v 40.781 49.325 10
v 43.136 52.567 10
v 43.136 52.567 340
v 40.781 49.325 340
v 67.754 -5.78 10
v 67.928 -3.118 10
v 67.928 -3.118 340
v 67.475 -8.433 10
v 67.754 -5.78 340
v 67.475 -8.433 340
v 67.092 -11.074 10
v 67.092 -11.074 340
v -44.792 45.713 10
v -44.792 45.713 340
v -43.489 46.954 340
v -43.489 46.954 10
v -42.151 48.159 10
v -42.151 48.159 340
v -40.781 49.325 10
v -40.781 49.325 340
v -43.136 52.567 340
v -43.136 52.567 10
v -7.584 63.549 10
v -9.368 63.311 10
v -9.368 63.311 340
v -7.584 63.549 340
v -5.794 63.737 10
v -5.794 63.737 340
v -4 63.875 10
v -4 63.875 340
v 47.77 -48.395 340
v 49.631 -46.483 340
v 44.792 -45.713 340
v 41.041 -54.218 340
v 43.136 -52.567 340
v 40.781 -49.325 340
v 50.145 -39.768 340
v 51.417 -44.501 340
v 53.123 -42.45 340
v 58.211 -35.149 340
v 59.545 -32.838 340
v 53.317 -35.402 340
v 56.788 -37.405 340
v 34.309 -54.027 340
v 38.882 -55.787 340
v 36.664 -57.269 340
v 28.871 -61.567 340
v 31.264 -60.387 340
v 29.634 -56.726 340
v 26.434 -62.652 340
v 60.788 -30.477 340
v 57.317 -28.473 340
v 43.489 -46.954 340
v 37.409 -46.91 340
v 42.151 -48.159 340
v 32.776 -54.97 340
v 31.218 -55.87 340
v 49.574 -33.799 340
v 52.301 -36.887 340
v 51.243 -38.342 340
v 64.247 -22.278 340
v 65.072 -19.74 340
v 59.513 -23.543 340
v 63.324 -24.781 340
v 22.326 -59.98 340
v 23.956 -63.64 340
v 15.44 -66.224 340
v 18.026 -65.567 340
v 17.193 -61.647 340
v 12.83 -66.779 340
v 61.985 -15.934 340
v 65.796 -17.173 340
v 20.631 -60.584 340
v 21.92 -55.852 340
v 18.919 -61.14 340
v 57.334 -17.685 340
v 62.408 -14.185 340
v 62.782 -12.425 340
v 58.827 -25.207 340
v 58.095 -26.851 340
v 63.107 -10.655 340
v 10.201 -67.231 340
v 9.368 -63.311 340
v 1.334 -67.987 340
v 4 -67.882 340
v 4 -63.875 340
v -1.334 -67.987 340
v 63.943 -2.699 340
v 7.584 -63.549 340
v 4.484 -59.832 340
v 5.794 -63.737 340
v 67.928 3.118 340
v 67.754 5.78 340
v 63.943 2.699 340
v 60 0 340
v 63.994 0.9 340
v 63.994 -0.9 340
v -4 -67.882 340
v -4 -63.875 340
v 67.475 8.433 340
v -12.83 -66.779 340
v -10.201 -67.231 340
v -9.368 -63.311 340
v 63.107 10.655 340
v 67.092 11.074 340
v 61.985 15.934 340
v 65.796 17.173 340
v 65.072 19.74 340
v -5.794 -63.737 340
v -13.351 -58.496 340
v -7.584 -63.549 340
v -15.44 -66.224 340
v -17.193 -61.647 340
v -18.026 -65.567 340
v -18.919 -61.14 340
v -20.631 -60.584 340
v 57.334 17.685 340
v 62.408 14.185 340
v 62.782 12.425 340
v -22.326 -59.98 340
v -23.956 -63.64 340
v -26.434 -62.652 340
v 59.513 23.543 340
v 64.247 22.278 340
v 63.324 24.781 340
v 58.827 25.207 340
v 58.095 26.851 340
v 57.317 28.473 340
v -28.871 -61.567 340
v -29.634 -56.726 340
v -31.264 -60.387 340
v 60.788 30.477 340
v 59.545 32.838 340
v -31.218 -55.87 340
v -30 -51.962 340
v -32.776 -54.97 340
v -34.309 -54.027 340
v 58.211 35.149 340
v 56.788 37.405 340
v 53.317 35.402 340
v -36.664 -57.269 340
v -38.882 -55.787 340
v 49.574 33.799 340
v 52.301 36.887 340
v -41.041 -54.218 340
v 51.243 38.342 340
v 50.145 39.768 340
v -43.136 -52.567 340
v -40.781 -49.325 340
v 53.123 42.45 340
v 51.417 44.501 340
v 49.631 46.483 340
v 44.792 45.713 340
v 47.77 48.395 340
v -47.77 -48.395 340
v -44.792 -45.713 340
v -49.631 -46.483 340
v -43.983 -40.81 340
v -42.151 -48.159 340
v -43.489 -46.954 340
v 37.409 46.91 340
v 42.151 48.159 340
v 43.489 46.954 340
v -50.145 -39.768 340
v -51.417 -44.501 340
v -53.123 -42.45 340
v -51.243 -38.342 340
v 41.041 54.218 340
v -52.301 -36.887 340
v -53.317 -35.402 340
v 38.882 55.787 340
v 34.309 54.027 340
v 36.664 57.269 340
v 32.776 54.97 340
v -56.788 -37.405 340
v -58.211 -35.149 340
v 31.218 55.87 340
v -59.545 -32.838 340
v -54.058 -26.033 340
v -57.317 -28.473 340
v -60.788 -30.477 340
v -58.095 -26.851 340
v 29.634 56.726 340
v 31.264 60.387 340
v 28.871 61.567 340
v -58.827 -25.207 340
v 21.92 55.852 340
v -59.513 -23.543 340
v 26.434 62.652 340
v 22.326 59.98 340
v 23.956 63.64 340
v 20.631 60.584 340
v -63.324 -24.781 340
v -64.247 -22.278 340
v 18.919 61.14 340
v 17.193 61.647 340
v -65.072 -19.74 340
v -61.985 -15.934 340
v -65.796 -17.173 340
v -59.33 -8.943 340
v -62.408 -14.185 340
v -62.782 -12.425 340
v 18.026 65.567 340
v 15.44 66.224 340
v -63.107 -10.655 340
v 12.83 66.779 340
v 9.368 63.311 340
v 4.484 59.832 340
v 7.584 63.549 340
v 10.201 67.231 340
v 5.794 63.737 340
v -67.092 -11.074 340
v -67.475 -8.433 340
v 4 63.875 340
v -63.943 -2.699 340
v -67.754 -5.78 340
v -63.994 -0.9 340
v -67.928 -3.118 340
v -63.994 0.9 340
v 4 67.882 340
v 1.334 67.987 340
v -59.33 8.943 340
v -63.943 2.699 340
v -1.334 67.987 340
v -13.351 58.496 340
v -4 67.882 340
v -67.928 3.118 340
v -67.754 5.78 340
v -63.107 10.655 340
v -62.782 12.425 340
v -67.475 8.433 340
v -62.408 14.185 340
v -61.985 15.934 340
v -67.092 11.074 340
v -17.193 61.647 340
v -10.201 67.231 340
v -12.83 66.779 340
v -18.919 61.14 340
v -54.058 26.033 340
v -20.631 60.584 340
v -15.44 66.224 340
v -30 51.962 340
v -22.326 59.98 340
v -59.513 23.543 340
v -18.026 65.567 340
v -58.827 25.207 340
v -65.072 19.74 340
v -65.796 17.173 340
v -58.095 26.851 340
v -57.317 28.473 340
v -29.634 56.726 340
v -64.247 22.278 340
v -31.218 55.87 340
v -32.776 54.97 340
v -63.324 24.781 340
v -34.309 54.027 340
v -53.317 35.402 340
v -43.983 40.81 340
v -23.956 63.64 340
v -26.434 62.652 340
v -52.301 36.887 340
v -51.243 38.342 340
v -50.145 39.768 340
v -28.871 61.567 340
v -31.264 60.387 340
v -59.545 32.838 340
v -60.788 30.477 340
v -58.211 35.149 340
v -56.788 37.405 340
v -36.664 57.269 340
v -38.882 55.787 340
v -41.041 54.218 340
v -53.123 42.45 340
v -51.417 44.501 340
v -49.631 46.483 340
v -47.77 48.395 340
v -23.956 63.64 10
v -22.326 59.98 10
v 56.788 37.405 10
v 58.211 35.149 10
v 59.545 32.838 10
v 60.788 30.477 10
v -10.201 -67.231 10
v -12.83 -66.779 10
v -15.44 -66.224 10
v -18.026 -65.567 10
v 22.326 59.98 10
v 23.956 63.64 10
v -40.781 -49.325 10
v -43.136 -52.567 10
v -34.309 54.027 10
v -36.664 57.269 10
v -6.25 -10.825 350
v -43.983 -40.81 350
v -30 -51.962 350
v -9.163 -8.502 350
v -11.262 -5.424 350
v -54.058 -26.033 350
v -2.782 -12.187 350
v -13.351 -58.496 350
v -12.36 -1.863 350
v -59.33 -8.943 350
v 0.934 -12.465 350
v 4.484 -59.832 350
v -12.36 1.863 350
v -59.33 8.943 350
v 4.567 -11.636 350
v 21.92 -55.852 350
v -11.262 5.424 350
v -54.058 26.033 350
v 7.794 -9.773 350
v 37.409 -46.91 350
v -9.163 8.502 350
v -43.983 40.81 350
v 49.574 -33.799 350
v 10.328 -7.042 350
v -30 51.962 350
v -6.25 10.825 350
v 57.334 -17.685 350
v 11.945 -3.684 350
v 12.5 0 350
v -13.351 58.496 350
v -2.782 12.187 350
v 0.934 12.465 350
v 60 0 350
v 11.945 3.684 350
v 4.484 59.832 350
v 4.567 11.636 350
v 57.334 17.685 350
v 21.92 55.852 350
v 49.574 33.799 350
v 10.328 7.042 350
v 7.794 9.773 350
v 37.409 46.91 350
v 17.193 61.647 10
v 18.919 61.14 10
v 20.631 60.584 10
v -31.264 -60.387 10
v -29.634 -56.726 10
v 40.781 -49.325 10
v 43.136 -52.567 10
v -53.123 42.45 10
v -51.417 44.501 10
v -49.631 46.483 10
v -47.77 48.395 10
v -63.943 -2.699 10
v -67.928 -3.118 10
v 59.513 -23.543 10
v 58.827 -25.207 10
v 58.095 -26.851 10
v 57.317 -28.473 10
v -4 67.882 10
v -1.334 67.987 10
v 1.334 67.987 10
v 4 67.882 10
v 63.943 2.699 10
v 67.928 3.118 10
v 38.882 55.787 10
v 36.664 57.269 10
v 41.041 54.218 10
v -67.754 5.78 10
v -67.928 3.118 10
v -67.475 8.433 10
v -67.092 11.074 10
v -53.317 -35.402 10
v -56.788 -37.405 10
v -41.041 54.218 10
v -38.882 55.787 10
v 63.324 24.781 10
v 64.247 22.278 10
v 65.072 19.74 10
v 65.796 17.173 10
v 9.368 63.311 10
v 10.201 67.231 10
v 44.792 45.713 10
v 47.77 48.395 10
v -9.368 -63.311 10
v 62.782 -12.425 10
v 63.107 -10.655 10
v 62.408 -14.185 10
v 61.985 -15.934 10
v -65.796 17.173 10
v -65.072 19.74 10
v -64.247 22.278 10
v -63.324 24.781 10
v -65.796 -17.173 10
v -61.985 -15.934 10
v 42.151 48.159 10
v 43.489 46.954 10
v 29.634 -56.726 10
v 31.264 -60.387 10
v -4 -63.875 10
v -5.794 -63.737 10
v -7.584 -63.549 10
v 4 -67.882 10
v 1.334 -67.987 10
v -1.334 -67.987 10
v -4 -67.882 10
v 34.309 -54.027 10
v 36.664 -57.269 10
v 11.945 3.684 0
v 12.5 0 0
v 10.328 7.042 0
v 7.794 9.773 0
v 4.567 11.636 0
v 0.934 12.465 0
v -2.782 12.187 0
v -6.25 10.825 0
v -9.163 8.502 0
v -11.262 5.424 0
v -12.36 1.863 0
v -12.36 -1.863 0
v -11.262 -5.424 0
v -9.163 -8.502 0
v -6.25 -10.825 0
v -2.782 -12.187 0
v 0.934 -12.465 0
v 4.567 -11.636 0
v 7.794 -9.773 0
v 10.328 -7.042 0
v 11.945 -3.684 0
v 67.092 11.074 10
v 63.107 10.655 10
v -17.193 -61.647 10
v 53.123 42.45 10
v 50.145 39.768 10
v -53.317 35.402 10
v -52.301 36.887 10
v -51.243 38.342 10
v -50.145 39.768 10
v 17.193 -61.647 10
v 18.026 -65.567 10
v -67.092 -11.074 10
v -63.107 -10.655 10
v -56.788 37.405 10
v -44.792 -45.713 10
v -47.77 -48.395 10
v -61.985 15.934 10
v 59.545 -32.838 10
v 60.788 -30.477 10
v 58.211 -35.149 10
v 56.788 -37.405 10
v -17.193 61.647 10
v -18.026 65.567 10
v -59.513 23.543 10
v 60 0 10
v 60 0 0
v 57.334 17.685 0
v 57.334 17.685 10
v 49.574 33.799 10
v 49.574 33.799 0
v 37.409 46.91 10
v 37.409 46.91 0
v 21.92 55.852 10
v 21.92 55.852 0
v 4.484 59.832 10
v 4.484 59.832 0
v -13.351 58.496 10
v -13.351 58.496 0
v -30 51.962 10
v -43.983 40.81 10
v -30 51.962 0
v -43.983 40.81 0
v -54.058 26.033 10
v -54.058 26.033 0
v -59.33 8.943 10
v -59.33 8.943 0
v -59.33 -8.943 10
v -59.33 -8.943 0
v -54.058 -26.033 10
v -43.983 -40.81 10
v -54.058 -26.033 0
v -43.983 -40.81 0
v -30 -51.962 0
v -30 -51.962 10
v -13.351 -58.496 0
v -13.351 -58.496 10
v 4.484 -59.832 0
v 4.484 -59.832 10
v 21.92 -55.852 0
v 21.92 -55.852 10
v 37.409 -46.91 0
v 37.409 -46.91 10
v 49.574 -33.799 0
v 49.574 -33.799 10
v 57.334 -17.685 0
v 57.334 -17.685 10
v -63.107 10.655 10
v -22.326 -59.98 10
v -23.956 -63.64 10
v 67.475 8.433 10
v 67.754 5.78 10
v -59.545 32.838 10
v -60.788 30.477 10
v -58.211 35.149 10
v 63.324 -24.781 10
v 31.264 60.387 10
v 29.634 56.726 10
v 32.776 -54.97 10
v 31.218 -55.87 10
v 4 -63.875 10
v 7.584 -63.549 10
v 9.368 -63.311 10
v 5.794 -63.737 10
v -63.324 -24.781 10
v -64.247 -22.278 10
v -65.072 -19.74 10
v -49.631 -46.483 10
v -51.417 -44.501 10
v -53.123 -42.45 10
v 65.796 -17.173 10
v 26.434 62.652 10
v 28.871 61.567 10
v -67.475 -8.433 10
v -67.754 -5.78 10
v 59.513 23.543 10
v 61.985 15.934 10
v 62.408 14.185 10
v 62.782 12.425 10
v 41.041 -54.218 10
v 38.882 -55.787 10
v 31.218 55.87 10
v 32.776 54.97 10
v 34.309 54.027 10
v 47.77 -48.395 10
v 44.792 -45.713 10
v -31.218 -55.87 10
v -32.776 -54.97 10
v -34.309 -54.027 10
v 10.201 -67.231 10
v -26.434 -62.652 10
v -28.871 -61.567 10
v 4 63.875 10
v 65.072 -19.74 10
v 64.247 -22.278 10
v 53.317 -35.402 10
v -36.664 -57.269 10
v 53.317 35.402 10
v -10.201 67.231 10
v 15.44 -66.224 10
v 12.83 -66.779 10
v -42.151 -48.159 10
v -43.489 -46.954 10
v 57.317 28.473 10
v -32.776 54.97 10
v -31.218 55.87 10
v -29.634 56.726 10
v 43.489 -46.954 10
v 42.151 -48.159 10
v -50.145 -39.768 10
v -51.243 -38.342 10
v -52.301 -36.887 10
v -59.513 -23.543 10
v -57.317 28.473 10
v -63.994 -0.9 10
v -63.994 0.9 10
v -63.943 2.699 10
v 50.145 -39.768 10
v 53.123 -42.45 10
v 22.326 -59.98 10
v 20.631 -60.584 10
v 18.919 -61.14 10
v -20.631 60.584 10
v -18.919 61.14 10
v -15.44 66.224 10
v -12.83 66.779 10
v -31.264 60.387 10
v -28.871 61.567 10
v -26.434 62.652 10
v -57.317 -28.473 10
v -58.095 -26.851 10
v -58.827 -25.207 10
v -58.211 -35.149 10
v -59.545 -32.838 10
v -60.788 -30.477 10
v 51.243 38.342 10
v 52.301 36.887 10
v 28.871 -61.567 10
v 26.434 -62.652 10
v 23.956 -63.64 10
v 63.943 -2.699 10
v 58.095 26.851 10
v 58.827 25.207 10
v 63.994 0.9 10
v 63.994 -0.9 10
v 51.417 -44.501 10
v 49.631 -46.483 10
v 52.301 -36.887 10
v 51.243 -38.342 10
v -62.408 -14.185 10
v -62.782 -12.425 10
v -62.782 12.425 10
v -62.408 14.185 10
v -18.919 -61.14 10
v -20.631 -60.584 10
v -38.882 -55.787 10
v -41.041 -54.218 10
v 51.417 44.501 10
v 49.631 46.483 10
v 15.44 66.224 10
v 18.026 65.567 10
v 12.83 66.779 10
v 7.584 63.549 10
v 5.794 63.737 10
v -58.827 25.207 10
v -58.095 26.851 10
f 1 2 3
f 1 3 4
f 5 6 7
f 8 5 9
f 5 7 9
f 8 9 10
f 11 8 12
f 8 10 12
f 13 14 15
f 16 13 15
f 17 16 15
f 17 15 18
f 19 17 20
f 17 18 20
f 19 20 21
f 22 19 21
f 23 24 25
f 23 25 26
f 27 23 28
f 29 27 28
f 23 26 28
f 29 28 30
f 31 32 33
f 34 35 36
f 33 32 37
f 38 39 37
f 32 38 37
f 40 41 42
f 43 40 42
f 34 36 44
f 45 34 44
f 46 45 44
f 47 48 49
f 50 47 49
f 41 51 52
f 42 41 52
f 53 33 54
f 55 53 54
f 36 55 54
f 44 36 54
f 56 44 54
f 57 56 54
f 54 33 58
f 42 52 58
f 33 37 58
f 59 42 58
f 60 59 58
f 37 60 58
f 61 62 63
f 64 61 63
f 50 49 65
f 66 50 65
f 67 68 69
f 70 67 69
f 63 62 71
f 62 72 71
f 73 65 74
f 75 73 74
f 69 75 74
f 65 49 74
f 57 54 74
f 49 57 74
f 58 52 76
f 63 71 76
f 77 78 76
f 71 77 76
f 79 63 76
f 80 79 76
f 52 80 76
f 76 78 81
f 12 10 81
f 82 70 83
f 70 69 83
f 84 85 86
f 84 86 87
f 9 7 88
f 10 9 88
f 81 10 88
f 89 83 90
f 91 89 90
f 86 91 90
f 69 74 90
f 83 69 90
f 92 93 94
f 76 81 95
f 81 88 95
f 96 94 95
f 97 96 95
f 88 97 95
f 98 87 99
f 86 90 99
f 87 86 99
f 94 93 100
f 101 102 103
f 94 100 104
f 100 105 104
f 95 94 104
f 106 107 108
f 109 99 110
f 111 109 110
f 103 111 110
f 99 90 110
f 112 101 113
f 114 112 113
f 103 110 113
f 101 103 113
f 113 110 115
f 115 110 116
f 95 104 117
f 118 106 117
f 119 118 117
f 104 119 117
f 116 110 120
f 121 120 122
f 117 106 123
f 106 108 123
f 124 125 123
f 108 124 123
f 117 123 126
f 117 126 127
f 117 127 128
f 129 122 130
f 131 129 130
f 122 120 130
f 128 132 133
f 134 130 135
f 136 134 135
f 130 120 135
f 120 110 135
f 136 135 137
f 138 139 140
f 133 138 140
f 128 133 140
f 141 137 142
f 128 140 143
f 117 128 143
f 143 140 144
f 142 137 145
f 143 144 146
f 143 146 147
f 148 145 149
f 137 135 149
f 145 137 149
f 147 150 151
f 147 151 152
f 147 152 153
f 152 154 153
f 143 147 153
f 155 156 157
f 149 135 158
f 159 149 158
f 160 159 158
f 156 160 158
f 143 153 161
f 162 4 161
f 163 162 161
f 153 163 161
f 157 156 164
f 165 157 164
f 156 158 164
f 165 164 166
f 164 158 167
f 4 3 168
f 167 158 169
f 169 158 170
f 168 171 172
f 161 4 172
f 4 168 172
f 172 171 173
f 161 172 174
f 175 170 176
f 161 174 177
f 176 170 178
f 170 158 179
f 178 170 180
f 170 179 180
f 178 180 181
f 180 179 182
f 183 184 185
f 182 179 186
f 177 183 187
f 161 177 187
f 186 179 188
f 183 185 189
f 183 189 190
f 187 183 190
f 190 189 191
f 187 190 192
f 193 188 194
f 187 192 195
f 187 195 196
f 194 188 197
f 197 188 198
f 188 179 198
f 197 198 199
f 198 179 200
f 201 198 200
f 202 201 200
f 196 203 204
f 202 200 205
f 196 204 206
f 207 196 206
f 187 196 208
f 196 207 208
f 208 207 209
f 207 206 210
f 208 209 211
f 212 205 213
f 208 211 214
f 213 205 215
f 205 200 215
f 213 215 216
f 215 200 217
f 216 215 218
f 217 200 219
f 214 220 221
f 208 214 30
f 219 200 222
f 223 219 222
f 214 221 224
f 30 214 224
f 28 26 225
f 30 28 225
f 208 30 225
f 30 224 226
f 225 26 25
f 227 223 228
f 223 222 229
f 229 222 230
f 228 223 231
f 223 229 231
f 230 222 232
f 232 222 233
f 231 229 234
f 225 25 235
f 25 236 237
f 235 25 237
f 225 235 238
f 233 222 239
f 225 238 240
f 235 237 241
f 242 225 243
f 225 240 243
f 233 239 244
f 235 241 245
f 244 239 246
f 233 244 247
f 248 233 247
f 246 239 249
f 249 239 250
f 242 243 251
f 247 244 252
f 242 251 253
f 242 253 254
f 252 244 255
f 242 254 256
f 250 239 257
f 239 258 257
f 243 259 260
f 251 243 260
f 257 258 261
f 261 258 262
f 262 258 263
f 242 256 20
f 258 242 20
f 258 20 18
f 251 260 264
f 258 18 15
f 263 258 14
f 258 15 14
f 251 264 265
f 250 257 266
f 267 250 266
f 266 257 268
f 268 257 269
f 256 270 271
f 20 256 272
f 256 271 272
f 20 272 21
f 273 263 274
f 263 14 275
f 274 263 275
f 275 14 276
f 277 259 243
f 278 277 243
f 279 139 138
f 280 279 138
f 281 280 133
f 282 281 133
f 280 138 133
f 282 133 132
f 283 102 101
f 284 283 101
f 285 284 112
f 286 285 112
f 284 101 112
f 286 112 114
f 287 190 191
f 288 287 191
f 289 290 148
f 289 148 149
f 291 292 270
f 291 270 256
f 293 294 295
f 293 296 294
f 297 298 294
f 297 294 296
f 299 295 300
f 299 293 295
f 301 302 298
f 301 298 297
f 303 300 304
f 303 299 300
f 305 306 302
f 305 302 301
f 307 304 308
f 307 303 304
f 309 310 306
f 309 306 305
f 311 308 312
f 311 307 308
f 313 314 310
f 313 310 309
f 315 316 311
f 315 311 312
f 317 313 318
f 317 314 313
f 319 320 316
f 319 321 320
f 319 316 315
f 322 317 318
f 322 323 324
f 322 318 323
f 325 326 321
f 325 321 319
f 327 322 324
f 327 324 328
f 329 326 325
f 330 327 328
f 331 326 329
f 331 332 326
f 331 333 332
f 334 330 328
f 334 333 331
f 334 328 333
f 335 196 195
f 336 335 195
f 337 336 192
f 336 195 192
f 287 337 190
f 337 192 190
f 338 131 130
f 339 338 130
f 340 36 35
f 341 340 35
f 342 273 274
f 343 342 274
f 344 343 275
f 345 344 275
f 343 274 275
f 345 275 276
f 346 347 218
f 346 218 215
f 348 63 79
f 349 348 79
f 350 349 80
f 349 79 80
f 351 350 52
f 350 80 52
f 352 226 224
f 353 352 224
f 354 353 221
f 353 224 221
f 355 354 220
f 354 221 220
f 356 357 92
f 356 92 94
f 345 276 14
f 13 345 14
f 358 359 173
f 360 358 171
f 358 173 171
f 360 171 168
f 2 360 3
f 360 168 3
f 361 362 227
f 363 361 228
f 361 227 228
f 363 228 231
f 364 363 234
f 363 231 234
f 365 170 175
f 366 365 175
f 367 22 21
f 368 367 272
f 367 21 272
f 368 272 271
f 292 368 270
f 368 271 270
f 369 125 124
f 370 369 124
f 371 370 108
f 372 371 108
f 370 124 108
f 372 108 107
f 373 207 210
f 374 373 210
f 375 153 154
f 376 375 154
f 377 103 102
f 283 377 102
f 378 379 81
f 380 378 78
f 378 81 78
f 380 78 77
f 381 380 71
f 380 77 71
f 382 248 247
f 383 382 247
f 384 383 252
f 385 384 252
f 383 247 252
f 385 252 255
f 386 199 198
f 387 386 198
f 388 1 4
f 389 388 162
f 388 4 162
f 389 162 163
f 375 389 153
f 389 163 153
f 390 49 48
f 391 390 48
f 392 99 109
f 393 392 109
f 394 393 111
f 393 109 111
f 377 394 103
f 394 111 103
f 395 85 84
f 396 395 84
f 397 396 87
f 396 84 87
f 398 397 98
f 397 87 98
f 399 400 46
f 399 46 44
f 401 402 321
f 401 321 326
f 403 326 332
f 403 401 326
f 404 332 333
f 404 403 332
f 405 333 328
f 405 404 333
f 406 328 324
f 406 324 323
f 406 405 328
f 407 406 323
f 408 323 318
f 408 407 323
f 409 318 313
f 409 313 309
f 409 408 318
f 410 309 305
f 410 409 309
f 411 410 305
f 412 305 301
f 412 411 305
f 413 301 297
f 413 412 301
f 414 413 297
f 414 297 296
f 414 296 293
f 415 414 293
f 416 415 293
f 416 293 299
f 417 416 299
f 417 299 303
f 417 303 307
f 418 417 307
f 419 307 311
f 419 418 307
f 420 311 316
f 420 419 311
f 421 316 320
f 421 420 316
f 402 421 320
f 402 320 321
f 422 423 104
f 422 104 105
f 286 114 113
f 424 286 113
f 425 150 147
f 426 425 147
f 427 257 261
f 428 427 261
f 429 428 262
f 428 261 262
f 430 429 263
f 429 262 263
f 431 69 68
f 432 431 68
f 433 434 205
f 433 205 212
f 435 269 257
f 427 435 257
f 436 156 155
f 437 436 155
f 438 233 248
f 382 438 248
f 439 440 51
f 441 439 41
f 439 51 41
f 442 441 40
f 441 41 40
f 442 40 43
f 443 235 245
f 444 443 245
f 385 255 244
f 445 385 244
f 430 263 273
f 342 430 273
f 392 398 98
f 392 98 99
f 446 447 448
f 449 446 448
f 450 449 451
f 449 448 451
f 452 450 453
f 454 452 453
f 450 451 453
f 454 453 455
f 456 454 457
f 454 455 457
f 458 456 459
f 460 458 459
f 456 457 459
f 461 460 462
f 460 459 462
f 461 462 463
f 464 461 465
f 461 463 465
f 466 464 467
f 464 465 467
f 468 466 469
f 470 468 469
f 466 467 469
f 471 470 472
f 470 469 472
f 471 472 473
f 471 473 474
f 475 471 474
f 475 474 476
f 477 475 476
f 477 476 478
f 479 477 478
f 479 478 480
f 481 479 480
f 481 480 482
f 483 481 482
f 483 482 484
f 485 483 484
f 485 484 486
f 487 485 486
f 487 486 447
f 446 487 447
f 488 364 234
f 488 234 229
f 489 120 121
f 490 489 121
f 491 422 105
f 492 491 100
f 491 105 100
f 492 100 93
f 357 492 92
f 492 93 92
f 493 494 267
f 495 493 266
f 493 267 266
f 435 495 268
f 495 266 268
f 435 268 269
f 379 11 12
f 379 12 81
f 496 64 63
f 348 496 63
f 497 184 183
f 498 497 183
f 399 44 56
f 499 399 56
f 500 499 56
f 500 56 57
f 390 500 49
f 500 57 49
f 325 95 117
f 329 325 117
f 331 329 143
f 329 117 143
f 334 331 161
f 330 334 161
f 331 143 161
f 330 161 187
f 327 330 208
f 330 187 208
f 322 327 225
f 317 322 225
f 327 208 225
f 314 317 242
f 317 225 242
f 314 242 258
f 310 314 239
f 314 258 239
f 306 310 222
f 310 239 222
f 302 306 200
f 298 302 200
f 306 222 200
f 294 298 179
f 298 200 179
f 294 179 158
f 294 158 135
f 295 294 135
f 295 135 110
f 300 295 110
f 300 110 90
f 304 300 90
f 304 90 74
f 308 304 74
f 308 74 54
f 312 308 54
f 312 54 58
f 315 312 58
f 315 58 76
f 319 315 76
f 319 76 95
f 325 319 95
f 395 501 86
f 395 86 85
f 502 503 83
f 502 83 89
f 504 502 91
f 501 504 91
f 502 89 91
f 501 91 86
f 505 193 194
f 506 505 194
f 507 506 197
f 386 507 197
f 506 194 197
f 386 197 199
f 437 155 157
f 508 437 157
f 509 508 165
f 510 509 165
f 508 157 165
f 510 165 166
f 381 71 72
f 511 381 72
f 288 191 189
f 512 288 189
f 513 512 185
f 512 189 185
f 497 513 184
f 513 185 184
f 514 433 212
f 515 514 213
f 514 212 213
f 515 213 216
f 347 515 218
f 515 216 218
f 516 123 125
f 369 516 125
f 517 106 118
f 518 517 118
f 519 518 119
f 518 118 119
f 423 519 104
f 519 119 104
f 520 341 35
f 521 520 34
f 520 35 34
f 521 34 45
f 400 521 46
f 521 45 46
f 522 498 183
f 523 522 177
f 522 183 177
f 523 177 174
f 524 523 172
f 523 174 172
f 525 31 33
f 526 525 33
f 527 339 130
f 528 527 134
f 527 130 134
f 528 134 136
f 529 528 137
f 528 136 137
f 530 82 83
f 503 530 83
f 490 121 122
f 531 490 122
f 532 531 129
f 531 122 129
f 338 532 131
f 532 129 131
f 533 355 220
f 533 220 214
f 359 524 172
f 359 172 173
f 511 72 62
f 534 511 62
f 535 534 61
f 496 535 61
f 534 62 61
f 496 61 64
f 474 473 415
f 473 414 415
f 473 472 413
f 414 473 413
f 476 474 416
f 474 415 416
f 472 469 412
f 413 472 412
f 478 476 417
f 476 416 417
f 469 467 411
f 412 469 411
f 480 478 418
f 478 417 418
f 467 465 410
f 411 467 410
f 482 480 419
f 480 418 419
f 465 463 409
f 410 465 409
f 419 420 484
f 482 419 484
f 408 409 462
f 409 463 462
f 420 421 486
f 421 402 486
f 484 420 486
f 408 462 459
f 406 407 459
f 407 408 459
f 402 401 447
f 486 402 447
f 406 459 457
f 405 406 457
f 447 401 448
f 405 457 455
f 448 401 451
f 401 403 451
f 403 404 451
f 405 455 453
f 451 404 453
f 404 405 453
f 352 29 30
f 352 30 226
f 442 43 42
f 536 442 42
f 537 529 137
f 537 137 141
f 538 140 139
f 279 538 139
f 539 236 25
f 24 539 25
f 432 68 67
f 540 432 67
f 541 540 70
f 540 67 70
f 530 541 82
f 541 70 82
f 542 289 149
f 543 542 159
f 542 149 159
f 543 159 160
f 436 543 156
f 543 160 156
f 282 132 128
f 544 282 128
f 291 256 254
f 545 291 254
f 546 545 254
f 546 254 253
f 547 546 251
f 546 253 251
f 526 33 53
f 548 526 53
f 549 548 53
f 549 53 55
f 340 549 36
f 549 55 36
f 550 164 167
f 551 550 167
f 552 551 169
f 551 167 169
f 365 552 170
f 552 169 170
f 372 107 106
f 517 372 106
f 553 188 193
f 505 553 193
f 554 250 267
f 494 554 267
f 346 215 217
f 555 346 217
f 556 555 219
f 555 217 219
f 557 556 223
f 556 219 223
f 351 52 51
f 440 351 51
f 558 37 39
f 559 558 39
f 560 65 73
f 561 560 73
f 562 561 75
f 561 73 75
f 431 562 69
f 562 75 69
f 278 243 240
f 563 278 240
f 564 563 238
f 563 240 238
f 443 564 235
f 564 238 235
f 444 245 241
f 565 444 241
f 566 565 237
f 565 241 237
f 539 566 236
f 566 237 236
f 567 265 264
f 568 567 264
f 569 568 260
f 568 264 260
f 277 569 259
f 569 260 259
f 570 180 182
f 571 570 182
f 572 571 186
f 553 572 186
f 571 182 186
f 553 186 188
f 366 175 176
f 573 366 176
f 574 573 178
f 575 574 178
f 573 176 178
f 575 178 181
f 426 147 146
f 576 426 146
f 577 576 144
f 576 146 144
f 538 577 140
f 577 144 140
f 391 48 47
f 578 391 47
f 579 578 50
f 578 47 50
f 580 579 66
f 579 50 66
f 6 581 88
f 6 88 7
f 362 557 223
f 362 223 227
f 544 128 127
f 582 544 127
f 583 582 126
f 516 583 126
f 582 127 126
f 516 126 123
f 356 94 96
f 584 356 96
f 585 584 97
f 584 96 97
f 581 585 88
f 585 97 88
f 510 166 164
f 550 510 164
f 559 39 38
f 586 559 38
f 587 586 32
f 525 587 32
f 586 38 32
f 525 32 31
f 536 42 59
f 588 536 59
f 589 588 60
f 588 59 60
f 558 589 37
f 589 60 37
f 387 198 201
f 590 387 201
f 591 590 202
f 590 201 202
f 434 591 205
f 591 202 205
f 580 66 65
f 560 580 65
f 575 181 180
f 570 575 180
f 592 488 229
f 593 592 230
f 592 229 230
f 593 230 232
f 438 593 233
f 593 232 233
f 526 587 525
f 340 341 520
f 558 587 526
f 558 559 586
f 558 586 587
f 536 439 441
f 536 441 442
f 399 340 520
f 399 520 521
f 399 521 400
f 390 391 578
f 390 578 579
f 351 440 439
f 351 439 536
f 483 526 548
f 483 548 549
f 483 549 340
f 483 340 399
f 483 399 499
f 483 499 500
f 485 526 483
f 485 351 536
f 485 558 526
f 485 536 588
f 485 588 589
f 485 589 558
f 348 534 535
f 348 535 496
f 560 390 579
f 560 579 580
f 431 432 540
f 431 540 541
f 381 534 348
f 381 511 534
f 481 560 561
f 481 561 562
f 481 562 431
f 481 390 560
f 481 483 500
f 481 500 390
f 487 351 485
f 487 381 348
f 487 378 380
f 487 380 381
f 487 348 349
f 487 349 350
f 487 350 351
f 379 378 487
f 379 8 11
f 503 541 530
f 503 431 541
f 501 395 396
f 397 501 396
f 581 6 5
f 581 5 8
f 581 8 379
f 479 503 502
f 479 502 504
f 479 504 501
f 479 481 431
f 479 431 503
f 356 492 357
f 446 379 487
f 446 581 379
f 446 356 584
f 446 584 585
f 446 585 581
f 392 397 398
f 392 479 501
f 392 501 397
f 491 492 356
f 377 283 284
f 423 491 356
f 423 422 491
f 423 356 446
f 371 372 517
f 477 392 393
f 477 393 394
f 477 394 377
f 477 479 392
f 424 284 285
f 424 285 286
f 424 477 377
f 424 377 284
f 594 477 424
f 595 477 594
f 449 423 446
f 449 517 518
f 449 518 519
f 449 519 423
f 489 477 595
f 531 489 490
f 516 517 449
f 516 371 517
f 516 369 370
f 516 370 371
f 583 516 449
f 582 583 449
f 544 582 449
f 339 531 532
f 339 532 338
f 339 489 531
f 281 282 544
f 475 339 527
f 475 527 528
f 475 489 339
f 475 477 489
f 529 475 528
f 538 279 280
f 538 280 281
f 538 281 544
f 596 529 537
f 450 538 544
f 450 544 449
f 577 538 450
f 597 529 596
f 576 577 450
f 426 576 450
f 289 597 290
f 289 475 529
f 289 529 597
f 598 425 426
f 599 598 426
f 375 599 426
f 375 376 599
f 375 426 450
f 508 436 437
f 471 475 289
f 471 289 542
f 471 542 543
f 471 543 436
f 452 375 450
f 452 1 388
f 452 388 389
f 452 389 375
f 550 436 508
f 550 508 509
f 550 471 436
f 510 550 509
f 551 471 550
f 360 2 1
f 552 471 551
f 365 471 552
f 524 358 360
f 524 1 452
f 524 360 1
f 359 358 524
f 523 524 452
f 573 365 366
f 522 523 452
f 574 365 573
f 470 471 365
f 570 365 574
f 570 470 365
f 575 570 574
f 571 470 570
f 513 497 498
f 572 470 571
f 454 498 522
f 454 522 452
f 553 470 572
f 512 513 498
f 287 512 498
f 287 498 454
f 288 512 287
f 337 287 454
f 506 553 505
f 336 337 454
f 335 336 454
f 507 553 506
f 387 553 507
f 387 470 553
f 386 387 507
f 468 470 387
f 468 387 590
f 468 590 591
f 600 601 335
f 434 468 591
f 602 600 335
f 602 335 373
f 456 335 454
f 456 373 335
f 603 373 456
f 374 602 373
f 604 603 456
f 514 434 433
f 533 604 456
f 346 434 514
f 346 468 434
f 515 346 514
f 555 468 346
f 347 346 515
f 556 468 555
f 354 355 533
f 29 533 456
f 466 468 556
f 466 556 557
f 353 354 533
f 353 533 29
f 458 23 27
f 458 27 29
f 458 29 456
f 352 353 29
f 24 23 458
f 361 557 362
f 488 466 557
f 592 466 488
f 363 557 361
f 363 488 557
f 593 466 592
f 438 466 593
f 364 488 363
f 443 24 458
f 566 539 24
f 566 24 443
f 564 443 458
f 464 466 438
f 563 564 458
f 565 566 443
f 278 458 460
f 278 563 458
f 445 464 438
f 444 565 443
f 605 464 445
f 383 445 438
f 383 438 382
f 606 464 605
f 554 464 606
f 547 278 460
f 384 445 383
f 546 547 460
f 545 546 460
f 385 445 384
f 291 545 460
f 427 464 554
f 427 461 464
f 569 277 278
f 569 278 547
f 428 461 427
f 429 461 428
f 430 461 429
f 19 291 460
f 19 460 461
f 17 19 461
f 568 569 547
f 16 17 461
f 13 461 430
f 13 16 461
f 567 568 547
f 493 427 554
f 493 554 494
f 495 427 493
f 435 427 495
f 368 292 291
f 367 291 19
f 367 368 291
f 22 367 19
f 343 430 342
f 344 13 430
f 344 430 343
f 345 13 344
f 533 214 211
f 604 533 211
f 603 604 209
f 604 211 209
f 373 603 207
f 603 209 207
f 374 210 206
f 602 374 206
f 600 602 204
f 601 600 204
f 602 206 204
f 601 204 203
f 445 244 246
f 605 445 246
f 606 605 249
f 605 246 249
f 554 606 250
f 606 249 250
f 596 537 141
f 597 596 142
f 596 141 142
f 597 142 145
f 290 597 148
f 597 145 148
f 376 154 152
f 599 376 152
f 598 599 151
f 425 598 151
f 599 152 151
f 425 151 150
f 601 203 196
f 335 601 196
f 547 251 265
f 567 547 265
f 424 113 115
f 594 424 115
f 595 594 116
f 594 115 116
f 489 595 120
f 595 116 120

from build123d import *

# Parameters (mm, degrees)
SKETCH1_R           = 60
SKETCH1_R_2         = 12.5
BOSS_EXTRUDE1_DEPTH = 350
SKETCH2_R           = 60
BOSS_EXTRUDE2_DEPTH = 330


with BuildPart() as part:
    # Sketch1 → Boss-Extrude1 (new body)
    with BuildSketch(Plane.XY):
        Circle(SKETCH1_R)
        Circle(SKETCH1_R_2, mode=Mode.SUBTRACT)
    extrude(amount=BOSS_EXTRUDE1_DEPTH)

    # Sketch2 → Boss-Extrude2 (add)
    with BuildSketch(Plane.XY.offset(340)):
        with BuildLine():
            Line((9.367743419, 63.310705124), (10.200923178, 67.230507705))
            ThreePointArc((10.200923178, 67.230507705), (14.137994976, 66.51403685), (18.026103984, 65.567214179))
            Line((18.026103984, 65.567214179), (17.192924224, 61.647411597))
            ThreePointArc((17.192924224, 61.647411597), (19.77708764, 60.867617043), (22.326071498, 59.979550944))
            Line((22.326071498, 59.979550944), (23.956017063, 63.640468622))
            ThreePointArc((23.956017063, 63.640468622), (27.658091729, 62.12109112), (31.264380724, 60.386575478))
            Line((31.264380724, 60.386575478), (29.634435159, 56.725657799))
            ThreePointArc((29.634435159, 56.725657799), (32, 55.425625842), (34.308643121, 54.027002575))
            Line((34.308643121, 54.027002575), (36.664118049, 57.26903568))
            ThreePointArc((36.664118049, 57.26903568), (39.969397156, 55.013155617), (43.136254004, 52.566753661))
            Line((43.136254004, 52.566753661), (40.780779076, 49.324720556))
            ThreePointArc((40.780779076, 49.324720556), (42.824358807, 47.561268831), (44.791762408, 45.713214942))
            Line((44.791762408, 45.713214942), (47.769821142, 48.39467107))
            ThreePointArc((47.769821142, 48.39467107), (50.533848132, 45.500881232), (53.122865993, 42.449512467))
            Line((53.122865993, 42.449512467), (50.144807259, 39.768056338))
            ThreePointArc((50.144807259, 39.768056338), (51.77708764, 37.618256147), (53.317266744, 35.40154046))
            Line((53.317266744, 35.40154046), (56.787753827, 37.405227112))
            ThreePointArc((56.787753827, 37.405227112), (58.889727457, 34), (60.787753827, 30.477023882))
            Line((60.787753827, 30.477023882), (57.317266744, 28.47333723))
            ThreePointArc((57.317266744, 28.47333723), (58.466909289, 26.031145157), (59.512550678, 23.542648785))
            Line((59.512550678, 23.542648785), (63.323789171, 24.780995239))
            ThreePointArc((63.323789171, 24.780995239), (64.671843108, 21.013155617), (65.795925126, 17.172543108))
            Line((65.795925126, 17.172543108), (61.984686633, 15.934196655))
            ThreePointArc((61.984686633, 15.934196655), (62.601446447, 13.306348212), (63.106850574, 10.654830388))
            Line((63.106850574, 10.654830388), (67.092271067, 11.073714961))
            ThreePointArc((67.092271067, 11.073714961), (67.627488885, 7.107935502), (67.928498773, 3.117539798))
            Line((67.928498773, 3.117539798), (63.94307828, 2.698655225))
            ThreePointArc((63.94307828, 2.698655225), (64, 0), (63.94307828, -2.698655225))
            Line((63.94307828, -2.698655225), (67.928498773, -3.117539798))
            ThreePointArc((67.928498773, -3.117539798), (67.627488885, -7.107935502), (67.092271067, -11.073714961))
            Line((67.092271067, -11.073714961), (63.106850574, -10.654830388))
            ThreePointArc((63.106850574, -10.654830388), (62.601446447, -13.306348212), (61.984686633, -15.934196655))
            Line((61.984686633, -15.934196655), (65.795925126, -17.172543108))
            ThreePointArc((65.795925126, -17.172543108), (64.671843108, -21.013155617), (63.323789171, -24.780995239))
            Line((63.323789171, -24.780995239), (59.512550678, -23.542648785))
            ThreePointArc((59.512550678, -23.542648785), (58.466909289, -26.031145157), (57.317266744, -28.47333723))
            Line((57.317266744, -28.47333723), (60.787753827, -30.477023882))
            ThreePointArc((60.787753827, -30.477023882), (58.889727457, -34), (56.787753827, -37.405227112))
            Line((56.787753827, -37.405227112), (53.317266744, -35.40154046))
            ThreePointArc((53.317266744, -35.40154046), (51.77708764, -37.618256147), (50.144807259, -39.768056338))
            Line((50.144807259, -39.768056338), (53.122865993, -42.449512467))
            ThreePointArc((53.122865993, -42.449512467), (50.533848132, -45.500881232), (47.769821142, -48.39467107))
            Line((47.769821142, -48.39467107), (44.791762408, -45.713214942))
            ThreePointArc((44.791762408, -45.713214942), (42.824358807, -47.561268831), (40.780779076, -49.324720556))
            Line((40.780779076, -49.324720556), (43.136254004, -52.566753661))
            ThreePointArc((43.136254004, -52.566753661), (39.969397156, -55.013155617), (36.664118049, -57.26903568))
            Line((36.664118049, -57.26903568), (34.308643121, -54.027002575))
            ThreePointArc((34.308643121, -54.027002575), (32, -55.425625842), (29.634435159, -56.725657799))
            Line((29.634435159, -56.725657799), (31.264380724, -60.386575478))
            ThreePointArc((31.264380724, -60.386575478), (27.658091729, -62.12109112), (23.956017063, -63.640468622))
            Line((23.956017063, -63.640468622), (22.326071498, -59.979550944))
            ThreePointArc((22.326071498, -59.979550944), (19.77708764, -60.867617043), (17.192924224, -61.647411597))
            Line((17.192924224, -61.647411597), (18.026103984, -65.567214179))
            ThreePointArc((18.026103984, -65.567214179), (14.137994976, -66.51403685), (10.200923178, -67.230507705))
            Line((10.200923178, -67.230507705), (9.367743419, -63.310705124))
            ThreePointArc((9.367743419, -63.310705124), (6.689821649, -63.649401304), (4, -63.874877691))
            Line((4, -63.874877691), (4, -67.882250994))
            ThreePointArc((4, -67.882250994), (0, -68), (-4, -67.882250994))
            Line((-4, -67.882250994), (-4, -63.874877691))
            ThreePointArc((-4, -63.874877691), (-6.689821649, -63.649401304), (-9.367743419, -63.310705124))
            Line((-9.367743419, -63.310705124), (-10.200923178, -67.230507705))
            ThreePointArc((-10.200923178, -67.230507705), (-14.137994976, -66.51403685), (-18.026103984, -65.567214179))
            Line((-18.026103984, -65.567214179), (-17.192924224, -61.647411597))
            ThreePointArc((-17.192924224, -61.647411597), (-19.77708764, -60.867617043), (-22.326071498, -59.979550944))
            Line((-22.326071498, -59.979550944), (-23.956017063, -63.640468622))
            ThreePointArc((-23.956017063, -63.640468622), (-27.658091729, -62.12109112), (-31.264380724, -60.386575478))
            Line((-31.264380724, -60.386575478), (-29.634435159, -56.725657799))
            ThreePointArc((-29.634435159, -56.725657799), (-32, -55.425625842), (-34.308643121, -54.027002575))
            Line((-34.308643121, -54.027002575), (-36.664118049, -57.26903568))
            ThreePointArc((-36.664118049, -57.26903568), (-39.969397156, -55.013155617), (-43.136254004, -52.566753661))
            Line((-43.136254004, -52.566753661), (-40.780779076, -49.324720556))
            ThreePointArc((-40.780779076, -49.324720556), (-42.824358807, -47.561268831), (-44.791762408, -45.713214942))
            Line((-44.791762408, -45.713214942), (-47.769821142, -48.39467107))
            ThreePointArc((-47.769821142, -48.39467107), (-50.533848132, -45.500881232), (-53.122865993, -42.449512467))
            Line((-53.122865993, -42.449512467), (-50.144807259, -39.768056338))
            ThreePointArc((-50.144807259, -39.768056338), (-51.77708764, -37.618256147), (-53.317266744, -35.40154046))
            Line((-53.317266744, -35.40154046), (-56.787753827, -37.405227112))
            ThreePointArc((-56.787753827, -37.405227112), (-58.889727457, -34), (-60.787753827, -30.477023882))
            Line((-60.787753827, -30.477023882), (-57.317266744, -28.47333723))
            ThreePointArc((-57.317266744, -28.47333723), (-58.466909289, -26.031145157), (-59.512550678, -23.542648785))
            Line((-59.512550678, -23.542648785), (-63.323789171, -24.780995239))
            ThreePointArc((-63.323789171, -24.780995239), (-64.671843108, -21.013155617), (-65.795925126, -17.172543108))
            Line((-65.795925126, -17.172543108), (-61.984686633, -15.934196655))
            ThreePointArc((-61.984686633, -15.934196655), (-62.601446447, -13.306348212), (-63.106850574, -10.654830388))
            Line((-63.106850574, -10.654830388), (-67.092271067, -11.073714961))
            ThreePointArc((-67.092271067, -11.073714961), (-67.627488885, -7.107935502), (-67.928498773, -3.117539798))
            Line((-67.928498773, -3.117539798), (-63.94307828, -2.698655225))
            ThreePointArc((-63.94307828, -2.698655225), (-64, 0), (-63.94307828, 2.698655225))
            Line((-63.94307828, 2.698655225), (-67.928498773, 3.117539798))
            ThreePointArc((-67.928498773, 3.117539798), (-67.627488885, 7.107935502), (-67.092271067, 11.073714961))
            Line((-67.092271067, 11.073714961), (-63.106850574, 10.654830388))
            ThreePointArc((-63.106850574, 10.654830388), (-62.601446447, 13.306348212), (-61.984686633, 15.934196655))
            Line((-61.984686633, 15.934196655), (-65.795925126, 17.172543108))
            ThreePointArc((-65.795925126, 17.172543108), (-64.671843108, 21.013155617), (-63.323789171, 24.780995239))
            Line((-63.323789171, 24.780995239), (-59.512550678, 23.542648785))
            ThreePointArc((-59.512550678, 23.542648785), (-58.466909289, 26.031145157), (-57.317266744, 28.47333723))
            Line((-57.317266744, 28.47333723), (-60.787753827, 30.477023882))
            ThreePointArc((-60.787753827, 30.477023882), (-58.889727457, 34), (-56.787753827, 37.405227112))
            Line((-56.787753827, 37.405227112), (-53.317266744, 35.40154046))
            ThreePointArc((-53.317266744, 35.40154046), (-51.77708764, 37.618256147), (-50.144807259, 39.768056338))
            Line((-50.144807259, 39.768056338), (-53.122865993, 42.449512467))
            ThreePointArc((-53.122865993, 42.449512467), (-50.533848132, 45.500881232), (-47.769821142, 48.39467107))
            Line((-47.769821142, 48.39467107), (-44.791762408, 45.713214942))
            ThreePointArc((-44.791762408, 45.713214942), (-42.824358807, 47.561268831), (-40.780779076, 49.324720556))
            Line((-40.780779076, 49.324720556), (-43.136254004, 52.566753661))
            ThreePointArc((-43.136254004, 52.566753661), (-39.969397156, 55.013155617), (-36.664118049, 57.26903568))
            Line((-36.664118049, 57.26903568), (-34.308643121, 54.027002575))
            ThreePointArc((-34.308643121, 54.027002575), (-32, 55.425625842), (-29.634435159, 56.725657799))
            Line((-29.634435159, 56.725657799), (-31.264380724, 60.386575478))
            ThreePointArc((-31.264380724, 60.386575478), (-27.658091729, 62.12109112), (-23.956017063, 63.640468622))
            Line((-23.956017063, 63.640468622), (-22.326071498, 59.979550944))
            ThreePointArc((-22.326071498, 59.979550944), (-19.77708764, 60.867617043), (-17.192924224, 61.647411597))
            Line((-17.192924224, 61.647411597), (-18.026103984, 65.567214179))
            ThreePointArc((-18.026103984, 65.567214179), (-14.137994976, 66.51403685), (-10.200923178, 67.230507705))
            Line((-10.200923178, 67.230507705), (-9.367743419, 63.310705124))
            ThreePointArc((-9.367743419, 63.310705124), (-6.689821649, 63.649401304), (-4, 63.874877691))
            Line((-4, 63.874877691), (-4, 67.882250994))
            ThreePointArc((-4, 67.882250994), (0, 68), (4, 67.882250994))
            Line((4, 67.882250994), (4, 63.874877691))
            ThreePointArc((4, 63.874877691), (6.689821649, 63.649401304), (9.367743419, 63.310705124))
        make_face()
        Circle(SKETCH2_R, mode=Mode.SUBTRACT)
    extrude(amount=-BOSS_EXTRUDE2_DEPTH)


solid = part.part
